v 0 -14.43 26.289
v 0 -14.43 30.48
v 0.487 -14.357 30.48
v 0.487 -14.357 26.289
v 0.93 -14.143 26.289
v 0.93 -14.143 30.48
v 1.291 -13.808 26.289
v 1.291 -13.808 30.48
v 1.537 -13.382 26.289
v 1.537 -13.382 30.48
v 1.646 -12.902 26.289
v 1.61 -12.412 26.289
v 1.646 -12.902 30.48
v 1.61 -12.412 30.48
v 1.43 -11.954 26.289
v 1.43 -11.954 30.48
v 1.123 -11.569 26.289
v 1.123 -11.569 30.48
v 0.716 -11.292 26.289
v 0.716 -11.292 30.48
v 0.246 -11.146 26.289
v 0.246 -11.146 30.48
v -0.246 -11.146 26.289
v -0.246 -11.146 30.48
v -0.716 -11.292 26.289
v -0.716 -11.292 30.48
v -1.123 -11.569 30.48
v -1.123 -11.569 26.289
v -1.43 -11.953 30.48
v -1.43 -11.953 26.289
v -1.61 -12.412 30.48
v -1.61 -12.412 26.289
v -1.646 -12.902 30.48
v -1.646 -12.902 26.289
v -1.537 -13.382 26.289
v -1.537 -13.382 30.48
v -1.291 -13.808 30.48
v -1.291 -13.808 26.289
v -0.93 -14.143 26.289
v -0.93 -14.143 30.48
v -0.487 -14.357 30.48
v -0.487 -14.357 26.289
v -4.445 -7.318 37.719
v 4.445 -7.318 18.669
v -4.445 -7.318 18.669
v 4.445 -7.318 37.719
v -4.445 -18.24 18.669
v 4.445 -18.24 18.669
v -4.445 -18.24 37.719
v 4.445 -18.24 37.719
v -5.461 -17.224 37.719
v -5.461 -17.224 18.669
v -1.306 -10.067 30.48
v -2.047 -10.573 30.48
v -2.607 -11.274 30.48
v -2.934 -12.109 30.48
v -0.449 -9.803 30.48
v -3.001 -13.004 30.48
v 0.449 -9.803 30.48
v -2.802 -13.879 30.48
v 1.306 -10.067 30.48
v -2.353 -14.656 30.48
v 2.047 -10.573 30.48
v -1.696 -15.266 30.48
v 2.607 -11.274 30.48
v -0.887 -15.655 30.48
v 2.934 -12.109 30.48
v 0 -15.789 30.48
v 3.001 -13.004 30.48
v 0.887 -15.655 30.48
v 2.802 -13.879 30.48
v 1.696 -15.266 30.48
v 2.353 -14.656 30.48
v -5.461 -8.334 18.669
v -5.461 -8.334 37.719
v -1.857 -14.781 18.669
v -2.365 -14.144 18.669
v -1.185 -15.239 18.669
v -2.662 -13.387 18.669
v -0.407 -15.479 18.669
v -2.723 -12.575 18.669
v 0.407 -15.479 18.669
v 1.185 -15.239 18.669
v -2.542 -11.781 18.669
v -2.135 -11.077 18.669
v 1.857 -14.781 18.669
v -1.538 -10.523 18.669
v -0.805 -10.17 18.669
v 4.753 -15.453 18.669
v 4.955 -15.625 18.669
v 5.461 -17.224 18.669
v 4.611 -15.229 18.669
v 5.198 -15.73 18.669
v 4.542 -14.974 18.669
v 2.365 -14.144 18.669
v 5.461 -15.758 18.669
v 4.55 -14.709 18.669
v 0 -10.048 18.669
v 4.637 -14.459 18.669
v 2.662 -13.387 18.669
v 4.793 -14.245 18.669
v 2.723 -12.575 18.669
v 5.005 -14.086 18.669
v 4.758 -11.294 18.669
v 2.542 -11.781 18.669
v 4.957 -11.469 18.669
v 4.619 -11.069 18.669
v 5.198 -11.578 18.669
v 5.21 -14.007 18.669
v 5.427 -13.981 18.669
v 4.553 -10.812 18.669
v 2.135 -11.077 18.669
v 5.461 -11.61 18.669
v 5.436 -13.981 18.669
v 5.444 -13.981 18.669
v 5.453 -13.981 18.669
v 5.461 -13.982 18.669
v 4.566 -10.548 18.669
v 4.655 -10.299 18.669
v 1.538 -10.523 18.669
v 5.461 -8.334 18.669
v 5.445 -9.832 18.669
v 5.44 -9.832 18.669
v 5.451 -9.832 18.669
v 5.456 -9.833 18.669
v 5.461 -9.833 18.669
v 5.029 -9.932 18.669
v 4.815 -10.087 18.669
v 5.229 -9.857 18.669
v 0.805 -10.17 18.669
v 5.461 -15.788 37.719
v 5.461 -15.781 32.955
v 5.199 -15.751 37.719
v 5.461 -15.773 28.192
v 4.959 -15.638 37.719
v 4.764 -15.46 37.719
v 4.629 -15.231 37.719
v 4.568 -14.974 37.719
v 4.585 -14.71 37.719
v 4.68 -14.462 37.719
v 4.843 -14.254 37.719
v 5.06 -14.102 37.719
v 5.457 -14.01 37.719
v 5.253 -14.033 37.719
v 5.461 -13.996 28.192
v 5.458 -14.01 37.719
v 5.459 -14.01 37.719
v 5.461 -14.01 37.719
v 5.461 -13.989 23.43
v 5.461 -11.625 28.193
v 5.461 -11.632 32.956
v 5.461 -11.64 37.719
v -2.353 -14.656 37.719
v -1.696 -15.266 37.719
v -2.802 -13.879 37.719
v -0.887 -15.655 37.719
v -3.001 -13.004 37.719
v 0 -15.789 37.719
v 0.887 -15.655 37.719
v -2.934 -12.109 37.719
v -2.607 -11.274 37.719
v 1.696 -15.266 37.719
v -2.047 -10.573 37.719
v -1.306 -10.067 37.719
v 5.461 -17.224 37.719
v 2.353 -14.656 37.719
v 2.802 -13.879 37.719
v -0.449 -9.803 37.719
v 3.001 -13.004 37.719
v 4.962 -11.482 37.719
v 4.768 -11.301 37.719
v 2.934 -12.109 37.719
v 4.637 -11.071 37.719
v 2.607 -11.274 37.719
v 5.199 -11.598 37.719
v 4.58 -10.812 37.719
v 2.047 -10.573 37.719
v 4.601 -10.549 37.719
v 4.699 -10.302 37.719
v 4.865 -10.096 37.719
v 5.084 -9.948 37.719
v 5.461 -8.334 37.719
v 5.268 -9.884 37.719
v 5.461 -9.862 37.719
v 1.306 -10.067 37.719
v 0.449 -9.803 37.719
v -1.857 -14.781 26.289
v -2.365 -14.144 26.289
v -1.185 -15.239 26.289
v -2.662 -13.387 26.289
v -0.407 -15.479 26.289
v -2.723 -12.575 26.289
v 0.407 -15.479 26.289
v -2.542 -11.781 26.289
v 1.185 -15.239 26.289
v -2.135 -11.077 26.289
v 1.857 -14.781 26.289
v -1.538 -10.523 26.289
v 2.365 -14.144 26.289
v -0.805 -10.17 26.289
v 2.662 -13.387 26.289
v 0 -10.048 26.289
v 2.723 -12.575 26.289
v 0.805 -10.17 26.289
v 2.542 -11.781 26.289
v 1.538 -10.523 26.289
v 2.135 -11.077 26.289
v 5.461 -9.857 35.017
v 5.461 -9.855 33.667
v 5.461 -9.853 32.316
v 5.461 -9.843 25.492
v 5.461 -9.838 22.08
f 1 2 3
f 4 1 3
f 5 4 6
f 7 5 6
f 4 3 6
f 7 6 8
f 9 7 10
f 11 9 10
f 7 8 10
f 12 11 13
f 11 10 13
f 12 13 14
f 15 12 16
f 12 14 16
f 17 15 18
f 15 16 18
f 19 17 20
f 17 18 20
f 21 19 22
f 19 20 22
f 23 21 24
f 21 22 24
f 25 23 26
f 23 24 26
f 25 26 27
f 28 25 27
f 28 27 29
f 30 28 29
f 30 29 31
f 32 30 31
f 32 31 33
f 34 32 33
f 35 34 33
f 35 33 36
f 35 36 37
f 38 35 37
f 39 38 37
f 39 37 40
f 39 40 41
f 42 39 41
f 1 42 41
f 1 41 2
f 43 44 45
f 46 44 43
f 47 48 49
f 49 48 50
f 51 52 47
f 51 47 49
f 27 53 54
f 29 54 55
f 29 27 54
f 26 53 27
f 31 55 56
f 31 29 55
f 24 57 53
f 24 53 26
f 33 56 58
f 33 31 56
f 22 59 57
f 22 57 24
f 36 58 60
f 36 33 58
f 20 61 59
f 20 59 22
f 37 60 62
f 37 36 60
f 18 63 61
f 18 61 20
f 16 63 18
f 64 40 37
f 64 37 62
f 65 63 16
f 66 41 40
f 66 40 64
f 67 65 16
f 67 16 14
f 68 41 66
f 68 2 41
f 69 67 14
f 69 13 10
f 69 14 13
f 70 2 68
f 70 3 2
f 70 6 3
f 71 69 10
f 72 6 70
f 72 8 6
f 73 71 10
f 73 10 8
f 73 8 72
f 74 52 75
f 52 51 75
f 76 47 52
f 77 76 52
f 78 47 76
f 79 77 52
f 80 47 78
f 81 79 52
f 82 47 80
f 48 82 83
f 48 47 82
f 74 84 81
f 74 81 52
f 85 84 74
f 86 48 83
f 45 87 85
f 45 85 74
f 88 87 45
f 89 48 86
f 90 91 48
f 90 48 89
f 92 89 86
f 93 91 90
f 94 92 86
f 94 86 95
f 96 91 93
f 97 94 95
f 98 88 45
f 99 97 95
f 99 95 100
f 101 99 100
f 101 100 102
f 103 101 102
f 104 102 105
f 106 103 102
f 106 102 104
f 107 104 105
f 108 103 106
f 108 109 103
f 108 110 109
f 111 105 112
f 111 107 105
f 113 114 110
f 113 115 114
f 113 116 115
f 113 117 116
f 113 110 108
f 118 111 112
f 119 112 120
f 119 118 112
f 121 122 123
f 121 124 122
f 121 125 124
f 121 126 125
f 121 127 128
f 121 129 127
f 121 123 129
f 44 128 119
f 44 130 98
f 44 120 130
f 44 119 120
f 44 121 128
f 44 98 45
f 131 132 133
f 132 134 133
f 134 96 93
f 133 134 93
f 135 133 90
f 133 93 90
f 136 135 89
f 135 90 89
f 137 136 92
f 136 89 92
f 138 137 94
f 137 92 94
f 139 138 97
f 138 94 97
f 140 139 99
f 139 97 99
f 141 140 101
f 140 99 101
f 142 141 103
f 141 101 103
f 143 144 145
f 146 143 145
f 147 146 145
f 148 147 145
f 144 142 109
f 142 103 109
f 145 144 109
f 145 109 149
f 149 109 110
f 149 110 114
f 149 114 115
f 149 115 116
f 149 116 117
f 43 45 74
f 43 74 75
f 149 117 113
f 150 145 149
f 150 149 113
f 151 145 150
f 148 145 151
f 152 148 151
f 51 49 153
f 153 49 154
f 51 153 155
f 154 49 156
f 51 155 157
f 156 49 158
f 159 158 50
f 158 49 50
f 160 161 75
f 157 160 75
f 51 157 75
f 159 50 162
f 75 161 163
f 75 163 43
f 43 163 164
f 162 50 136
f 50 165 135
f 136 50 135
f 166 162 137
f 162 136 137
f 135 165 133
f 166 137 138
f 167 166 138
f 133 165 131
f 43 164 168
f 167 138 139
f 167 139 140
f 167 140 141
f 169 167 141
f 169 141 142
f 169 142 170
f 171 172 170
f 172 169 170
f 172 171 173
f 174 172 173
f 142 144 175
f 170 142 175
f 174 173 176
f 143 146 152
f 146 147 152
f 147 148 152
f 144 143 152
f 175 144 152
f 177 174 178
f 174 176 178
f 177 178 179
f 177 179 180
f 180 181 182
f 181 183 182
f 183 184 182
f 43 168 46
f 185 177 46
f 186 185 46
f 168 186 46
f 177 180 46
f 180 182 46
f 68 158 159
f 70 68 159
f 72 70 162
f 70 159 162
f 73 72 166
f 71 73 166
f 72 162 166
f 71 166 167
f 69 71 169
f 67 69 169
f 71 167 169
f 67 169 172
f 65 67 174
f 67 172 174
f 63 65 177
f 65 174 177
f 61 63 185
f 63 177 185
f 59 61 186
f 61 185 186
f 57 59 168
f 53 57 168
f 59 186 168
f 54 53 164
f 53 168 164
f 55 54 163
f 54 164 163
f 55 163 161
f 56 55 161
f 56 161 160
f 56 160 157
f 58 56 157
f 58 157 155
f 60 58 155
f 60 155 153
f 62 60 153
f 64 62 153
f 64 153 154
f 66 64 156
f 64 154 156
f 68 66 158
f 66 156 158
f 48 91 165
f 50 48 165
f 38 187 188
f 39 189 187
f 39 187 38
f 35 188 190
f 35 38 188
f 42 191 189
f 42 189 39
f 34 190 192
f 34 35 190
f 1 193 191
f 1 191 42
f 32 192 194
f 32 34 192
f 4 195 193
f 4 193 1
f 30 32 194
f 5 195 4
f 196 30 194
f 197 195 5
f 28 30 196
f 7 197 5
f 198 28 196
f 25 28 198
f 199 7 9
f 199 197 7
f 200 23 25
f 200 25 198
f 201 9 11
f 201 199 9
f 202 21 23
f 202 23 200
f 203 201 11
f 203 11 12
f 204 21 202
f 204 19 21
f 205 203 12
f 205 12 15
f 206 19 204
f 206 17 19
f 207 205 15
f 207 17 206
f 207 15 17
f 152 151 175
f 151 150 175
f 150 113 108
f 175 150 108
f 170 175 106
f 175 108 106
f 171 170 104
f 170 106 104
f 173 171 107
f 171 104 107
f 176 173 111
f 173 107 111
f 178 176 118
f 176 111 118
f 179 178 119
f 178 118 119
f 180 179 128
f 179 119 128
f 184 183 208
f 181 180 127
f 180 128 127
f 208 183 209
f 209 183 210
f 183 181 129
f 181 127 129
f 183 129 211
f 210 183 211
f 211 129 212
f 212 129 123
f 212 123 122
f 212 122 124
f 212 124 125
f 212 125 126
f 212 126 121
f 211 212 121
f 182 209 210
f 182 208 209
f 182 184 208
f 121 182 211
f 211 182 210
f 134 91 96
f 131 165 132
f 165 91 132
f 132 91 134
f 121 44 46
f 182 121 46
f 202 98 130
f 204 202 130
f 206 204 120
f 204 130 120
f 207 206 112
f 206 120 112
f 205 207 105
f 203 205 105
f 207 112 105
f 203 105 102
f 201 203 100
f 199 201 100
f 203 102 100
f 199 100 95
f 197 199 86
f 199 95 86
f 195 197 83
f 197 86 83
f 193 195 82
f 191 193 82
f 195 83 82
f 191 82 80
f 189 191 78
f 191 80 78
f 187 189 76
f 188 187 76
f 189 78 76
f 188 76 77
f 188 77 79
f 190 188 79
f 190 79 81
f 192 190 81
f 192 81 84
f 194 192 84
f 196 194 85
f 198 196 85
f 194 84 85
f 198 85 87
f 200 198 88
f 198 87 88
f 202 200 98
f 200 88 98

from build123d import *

# Parameters (mm, degrees)
SKETCH031_W     = 10.922
SKETCH031_H     = 19.05
PAD002_DEPTH    = 5.461
SKETCH033_R     = 3.0099
POCKET003_DEPTH = 7.239
SKETCH035_R     = 1.651
POCKET004_DEPTH = 19.051
SKETCH036_R     = 2.7305
POCKET005_DEPTH = 7.62
SKETCH039_R     = 0.889
POCKET006_DEPTH = 19.082657
CHAMFER_SIZE    = 1.016


with BuildPart() as part:
    # Sketch031 → Pad002 (new body, symmetric)
    with BuildSketch(Plane.YZ):
        with Locations((-9.779, 28.194)):
            Rectangle(SKETCH031_W, SKETCH031_H)
    extrude(amount=PAD002_DEPTH, both=True)

    # Sketch033 (on Face1 of Pad002) → Pocket003 (cut)
    with BuildSketch(Plane(origin=(0, 0, 37.719), x_dir=(0, -1, 0), z_dir=(0, 0, 1))):
        with Locations((9.779, 0)):
            Circle(SKETCH033_R)
    extrude(amount=-POCKET003_DEPTH, mode=Mode.SUBTRACT)

    # Sketch035 (on Face1 of Pad002) → Pocket004 (cut, through all)
    with BuildSketch(Plane(origin=(0, 0, 37.719), x_dir=(0, -1, 0), z_dir=(0, 0, 1))):
        with Locations((9.779, 0)):
            Circle(SKETCH035_R)
    extrude(amount=-POCKET004_DEPTH, mode=Mode.SUBTRACT)

    # Sketch036 (on Face7 of Pocket004) → Pocket005 (cut)
    with BuildSketch(Plane.YX.offset(-18.669)):
        with Locations((-9.779, 0)):
            Circle(SKETCH036_R)
    extrude(amount=-POCKET005_DEPTH, mode=Mode.SUBTRACT)

    # Sketch039 → Pocket006 (cut, through all)
    with BuildSketch(Plane(origin=(0, 0, 18.669), x_dir=(0.003059, 0.999994, 0.001528), z_dir=(-0.001528, 0.001533, -0.999998))):
        with Locations((-11.853333, 5.461)):
            Circle(SKETCH039_R)
        with Locations((-7.704667, 5.461)):
            Circle(SKETCH039_R)
    extrude(amount=-POCKET006_DEPTH, mode=Mode.SUBTRACT)

    # Chamfer
    chamfer_edges = [part.edges().sort_by_distance(p)[0] for p in [
        (-5.461, -4.318, 28.194),
        (-5.461, -15.24, 28.194),
        (5.461, -15.24, 28.194),
        (5.461, -4.318, 28.194),
    ]]
    chamfer(chamfer_edges, length=CHAMFER_SIZE)


with BuildPart() as part_1:
    # Body001 placement: moved
    add(part.part.moved(Location((0, -3, 0))))


solid = part_1.part
